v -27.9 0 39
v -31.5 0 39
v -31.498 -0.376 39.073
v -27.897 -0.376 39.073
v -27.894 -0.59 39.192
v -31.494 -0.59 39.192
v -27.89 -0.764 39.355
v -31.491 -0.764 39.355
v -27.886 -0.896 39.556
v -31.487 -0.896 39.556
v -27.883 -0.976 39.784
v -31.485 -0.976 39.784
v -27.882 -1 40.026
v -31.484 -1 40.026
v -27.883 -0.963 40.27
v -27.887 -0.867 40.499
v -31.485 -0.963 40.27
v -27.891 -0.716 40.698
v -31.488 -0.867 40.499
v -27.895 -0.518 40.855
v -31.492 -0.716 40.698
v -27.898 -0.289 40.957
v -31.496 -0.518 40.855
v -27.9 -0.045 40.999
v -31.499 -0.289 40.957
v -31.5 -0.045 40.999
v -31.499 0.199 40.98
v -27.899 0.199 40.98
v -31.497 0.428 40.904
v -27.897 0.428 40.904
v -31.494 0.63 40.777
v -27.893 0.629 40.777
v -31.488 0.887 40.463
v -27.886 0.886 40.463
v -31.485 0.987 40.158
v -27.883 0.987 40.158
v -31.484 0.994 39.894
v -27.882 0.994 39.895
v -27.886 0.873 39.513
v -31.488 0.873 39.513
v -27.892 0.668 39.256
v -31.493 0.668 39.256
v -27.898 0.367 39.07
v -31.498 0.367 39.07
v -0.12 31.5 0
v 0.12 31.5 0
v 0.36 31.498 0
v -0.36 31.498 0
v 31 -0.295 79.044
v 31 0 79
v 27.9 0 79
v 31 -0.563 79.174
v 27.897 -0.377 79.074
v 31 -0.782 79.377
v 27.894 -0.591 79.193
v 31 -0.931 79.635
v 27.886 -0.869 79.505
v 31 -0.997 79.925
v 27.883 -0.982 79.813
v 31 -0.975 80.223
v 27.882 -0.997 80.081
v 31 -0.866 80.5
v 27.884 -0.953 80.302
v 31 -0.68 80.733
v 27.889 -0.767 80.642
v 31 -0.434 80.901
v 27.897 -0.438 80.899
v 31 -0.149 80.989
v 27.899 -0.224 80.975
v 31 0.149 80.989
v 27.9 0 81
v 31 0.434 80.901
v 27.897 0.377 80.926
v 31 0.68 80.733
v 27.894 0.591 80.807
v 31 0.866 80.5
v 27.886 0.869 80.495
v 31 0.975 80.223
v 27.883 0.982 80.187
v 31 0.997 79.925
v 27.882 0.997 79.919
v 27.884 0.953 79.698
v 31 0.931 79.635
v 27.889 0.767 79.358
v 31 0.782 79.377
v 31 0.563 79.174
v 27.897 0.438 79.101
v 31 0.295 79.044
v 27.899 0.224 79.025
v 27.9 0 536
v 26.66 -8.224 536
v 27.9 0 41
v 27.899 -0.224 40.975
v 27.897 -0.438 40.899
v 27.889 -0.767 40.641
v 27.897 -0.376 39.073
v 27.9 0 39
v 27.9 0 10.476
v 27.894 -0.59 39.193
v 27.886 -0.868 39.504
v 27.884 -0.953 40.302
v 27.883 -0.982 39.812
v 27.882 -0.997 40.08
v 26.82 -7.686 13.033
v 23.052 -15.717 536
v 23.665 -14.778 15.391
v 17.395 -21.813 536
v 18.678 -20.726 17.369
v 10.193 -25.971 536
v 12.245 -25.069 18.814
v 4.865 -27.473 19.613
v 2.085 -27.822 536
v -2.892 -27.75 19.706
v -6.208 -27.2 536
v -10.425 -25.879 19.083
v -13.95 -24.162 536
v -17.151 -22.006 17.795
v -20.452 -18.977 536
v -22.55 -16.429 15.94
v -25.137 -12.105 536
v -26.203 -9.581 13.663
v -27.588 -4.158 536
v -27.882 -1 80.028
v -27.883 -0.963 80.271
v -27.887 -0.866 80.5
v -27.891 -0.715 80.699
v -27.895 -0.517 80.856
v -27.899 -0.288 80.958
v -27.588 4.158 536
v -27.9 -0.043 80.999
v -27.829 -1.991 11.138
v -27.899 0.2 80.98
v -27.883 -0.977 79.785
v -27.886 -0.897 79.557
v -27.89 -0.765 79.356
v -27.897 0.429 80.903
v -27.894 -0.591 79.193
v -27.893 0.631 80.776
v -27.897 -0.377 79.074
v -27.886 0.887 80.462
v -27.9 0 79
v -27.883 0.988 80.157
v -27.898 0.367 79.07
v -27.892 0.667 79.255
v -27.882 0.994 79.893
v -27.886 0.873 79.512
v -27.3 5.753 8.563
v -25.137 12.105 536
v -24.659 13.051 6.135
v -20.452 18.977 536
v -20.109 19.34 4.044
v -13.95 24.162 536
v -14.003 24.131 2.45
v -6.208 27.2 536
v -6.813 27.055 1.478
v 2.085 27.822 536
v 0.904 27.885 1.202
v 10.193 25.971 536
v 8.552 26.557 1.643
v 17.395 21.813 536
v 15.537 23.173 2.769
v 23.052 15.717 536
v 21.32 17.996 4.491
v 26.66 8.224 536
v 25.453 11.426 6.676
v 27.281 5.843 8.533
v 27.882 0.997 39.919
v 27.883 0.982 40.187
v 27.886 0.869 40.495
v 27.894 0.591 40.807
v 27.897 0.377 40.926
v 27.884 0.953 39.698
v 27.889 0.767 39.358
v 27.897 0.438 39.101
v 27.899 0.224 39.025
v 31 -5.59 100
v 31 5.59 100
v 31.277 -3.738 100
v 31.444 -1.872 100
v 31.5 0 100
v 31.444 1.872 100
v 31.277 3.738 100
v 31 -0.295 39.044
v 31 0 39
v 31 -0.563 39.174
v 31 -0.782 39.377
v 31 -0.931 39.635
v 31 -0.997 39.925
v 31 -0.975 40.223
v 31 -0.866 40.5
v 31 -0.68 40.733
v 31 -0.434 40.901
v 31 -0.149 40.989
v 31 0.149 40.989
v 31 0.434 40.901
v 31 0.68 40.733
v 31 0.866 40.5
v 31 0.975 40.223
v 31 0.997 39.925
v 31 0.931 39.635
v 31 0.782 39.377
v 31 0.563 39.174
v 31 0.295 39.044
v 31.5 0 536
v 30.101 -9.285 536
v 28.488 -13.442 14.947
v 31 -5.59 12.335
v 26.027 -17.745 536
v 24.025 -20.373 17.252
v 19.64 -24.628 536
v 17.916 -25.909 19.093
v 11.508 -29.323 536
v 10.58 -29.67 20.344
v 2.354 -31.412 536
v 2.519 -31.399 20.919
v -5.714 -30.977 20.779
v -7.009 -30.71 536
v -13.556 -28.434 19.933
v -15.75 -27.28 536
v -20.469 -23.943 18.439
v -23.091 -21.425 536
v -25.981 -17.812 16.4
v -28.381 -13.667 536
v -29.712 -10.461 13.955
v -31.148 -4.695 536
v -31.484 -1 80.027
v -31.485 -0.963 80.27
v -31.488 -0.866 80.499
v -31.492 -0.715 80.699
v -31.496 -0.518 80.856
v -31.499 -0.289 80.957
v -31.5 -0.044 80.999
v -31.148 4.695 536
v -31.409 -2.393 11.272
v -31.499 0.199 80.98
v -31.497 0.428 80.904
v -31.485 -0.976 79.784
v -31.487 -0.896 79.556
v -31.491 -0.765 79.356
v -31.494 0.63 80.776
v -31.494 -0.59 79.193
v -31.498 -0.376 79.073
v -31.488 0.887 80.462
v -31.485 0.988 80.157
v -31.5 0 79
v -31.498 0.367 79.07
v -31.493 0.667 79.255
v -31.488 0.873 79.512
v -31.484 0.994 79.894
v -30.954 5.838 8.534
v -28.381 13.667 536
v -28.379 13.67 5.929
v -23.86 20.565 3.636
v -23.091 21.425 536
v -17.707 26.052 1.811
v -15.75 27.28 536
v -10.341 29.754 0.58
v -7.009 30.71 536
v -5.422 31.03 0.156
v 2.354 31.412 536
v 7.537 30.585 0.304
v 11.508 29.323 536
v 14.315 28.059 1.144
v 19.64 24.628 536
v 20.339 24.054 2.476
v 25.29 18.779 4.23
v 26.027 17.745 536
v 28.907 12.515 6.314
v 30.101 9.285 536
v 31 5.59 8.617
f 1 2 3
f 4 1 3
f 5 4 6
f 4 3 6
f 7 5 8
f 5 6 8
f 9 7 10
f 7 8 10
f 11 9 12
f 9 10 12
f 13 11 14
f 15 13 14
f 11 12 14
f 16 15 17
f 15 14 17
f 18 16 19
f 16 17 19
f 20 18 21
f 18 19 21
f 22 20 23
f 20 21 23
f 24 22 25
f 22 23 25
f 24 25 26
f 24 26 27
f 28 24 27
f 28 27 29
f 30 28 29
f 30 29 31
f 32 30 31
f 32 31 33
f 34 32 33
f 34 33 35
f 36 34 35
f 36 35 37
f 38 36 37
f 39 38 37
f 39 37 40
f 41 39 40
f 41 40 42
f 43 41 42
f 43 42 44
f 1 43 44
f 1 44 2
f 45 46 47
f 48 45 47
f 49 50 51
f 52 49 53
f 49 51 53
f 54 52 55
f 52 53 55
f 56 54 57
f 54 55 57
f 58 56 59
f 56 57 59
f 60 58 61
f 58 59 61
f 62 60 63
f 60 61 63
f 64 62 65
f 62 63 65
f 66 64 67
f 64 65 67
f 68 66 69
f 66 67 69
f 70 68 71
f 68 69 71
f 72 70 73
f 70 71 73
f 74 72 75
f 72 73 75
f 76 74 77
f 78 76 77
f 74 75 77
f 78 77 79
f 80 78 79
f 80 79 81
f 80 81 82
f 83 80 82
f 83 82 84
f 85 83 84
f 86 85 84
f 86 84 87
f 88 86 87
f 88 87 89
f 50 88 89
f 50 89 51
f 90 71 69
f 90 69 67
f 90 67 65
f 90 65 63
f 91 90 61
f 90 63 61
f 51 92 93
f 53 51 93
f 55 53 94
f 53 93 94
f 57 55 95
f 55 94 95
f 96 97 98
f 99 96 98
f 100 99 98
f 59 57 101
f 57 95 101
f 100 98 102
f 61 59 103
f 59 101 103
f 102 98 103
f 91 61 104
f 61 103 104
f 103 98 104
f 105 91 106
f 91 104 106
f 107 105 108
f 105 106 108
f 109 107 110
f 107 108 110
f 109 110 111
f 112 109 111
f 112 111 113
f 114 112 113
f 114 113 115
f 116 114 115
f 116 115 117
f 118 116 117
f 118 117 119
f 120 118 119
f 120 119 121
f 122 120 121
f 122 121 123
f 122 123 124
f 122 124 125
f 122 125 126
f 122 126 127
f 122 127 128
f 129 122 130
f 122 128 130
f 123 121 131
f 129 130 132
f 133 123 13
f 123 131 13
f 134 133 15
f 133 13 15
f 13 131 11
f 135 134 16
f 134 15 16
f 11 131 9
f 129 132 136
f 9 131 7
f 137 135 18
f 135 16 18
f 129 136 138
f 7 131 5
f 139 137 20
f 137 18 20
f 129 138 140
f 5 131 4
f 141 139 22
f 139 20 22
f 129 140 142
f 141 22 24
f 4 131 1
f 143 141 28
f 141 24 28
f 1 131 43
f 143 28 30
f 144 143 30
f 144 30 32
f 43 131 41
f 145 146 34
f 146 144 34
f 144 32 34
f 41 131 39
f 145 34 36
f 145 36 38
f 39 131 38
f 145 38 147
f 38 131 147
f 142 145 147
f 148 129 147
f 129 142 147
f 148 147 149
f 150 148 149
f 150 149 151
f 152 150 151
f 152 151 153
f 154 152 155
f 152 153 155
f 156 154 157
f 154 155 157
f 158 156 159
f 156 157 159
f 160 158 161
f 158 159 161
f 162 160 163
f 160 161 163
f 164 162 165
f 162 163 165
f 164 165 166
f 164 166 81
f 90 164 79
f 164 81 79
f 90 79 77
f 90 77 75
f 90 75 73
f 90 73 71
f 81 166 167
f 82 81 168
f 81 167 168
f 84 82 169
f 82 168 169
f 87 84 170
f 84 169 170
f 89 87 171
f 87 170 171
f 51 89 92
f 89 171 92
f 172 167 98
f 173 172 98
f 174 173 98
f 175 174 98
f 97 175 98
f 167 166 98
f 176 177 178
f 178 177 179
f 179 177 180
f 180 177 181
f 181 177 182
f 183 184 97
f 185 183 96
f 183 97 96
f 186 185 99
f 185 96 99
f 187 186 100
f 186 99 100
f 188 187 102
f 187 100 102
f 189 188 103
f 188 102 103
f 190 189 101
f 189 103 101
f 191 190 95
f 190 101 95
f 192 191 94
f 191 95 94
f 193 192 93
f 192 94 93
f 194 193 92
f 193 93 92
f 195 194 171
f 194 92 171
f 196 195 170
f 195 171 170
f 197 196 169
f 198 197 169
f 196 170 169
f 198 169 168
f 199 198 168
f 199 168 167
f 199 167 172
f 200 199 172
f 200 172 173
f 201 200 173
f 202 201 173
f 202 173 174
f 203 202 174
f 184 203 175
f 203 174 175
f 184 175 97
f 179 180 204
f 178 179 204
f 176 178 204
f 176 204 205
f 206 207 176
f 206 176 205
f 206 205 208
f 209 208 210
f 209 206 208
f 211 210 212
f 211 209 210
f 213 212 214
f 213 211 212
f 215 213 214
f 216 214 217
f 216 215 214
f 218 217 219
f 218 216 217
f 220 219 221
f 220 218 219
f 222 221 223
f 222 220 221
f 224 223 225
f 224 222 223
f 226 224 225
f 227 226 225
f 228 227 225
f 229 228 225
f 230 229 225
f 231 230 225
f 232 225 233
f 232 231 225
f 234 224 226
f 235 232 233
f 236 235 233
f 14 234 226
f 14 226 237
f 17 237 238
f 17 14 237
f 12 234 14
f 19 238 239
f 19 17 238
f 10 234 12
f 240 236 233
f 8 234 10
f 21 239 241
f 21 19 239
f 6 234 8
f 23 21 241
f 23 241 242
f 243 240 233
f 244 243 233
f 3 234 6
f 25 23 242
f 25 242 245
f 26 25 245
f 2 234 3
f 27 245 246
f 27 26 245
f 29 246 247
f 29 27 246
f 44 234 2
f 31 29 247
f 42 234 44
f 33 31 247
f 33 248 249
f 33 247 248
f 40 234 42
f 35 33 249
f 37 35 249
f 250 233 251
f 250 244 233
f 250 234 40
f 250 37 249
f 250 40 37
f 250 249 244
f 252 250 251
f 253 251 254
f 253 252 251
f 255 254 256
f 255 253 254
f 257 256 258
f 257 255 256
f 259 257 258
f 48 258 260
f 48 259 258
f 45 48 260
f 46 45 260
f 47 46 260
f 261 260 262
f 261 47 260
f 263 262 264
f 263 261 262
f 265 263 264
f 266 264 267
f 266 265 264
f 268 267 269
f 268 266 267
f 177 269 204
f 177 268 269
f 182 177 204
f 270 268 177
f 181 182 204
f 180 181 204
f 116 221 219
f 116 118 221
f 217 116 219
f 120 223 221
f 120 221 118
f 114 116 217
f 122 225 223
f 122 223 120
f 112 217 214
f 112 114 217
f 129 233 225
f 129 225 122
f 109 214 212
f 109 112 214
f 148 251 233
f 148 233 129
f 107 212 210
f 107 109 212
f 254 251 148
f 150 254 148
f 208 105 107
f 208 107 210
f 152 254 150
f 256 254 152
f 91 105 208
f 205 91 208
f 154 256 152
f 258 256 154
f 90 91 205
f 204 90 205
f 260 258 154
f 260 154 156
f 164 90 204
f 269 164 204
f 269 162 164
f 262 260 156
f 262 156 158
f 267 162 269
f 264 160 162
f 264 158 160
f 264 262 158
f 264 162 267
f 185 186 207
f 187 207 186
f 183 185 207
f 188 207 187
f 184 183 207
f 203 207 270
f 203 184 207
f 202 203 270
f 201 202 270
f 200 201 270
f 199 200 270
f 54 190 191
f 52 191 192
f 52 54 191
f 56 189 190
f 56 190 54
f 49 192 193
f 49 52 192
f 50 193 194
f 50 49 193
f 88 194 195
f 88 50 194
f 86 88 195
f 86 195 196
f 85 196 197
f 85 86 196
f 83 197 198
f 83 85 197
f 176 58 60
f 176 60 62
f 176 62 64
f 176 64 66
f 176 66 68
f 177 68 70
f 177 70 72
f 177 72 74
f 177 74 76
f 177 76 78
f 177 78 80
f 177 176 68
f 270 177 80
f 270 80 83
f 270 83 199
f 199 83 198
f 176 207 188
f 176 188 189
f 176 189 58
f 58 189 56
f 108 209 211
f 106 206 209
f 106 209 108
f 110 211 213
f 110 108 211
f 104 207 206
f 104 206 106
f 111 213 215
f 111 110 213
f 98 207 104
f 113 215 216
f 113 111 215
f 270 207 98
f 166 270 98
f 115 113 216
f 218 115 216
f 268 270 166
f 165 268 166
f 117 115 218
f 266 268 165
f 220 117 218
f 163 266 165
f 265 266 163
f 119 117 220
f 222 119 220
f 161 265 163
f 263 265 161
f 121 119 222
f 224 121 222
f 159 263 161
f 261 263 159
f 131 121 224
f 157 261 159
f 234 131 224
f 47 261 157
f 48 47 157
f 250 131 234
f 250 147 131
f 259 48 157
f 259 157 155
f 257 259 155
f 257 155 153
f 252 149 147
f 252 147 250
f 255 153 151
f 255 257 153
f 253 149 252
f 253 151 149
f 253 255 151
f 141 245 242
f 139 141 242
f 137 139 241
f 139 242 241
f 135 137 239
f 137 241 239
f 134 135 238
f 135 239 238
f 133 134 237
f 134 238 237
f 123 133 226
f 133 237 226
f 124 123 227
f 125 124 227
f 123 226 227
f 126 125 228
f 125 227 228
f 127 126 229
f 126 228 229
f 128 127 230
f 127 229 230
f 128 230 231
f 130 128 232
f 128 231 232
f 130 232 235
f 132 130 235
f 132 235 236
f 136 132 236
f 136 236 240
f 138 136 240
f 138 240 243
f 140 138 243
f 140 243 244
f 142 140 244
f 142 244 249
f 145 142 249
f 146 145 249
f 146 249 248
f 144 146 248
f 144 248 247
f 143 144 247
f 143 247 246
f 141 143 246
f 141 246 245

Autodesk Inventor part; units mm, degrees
sketch "Sketch1" plane through (0, 0, 0) normal (0, 0, 1) x (1, 0, 0)
  circle A0 centre (0, 0) radius 31.5
  circle A1 centre (0, 0) radius 27.9
  dimension "d0" = 63
  dimension "d2" = 3.6
extrude "tube" add sketch "Sketch1" along normal blind 536
sketch "Sketch15" plane through (0, 0, 536) normal (0, 0, 1) x (1, 0, 0)
  circle A0 centre (0, 0) radius 27.9 projected
  circle A1 centre (0, 0) radius 31.5 projected
  point P0 (31.5, 0)
ref_plane "Work Plane6" through (31.5, 0, 536) normal (1, 0, 0) x (0, 1, 0)
ref_plane "Work Plane7" through (31, 0, 0) normal (1, 0, 0) x (0, 1, 0)
sketch "Sketch19" plane through (31, 0, 0) normal (1, 0, 0) x (0, 1, 0)
  line L0 (-10, 0) -> (10, 0)
  line L1 (10, 0) -> (10, 100)
  line L2 (10, 100) -> (-10, 100)
  line L3 (-10, 100) -> (-10, 0)
  point P0 (0, 0)
  point P1 (0, 0)
  dimension "d67" = 20
  dimension "d68" = 100
extrude "flatFaceYellow" cut sketch "Sketch19" along normal blind 25.4
sketch "Sketch21" plane through (0, 0, 0) normal (0, 0, -1) x (-1, 0, 0)
  line L0 (-31, 5.5902) -> (-31, -5.5902) projected
  arc A0 (-31, -5.5902) -> (-31, 5.5902) centre (0, 0) ccw projected
  circle A1 centre (0, 0) radius 27.9 projected
  line L1 (0.7293, 31.4916) -> (30.8537, 31.4916) construction
ref_plane "Work Plane8" through (-0.7293, 31.4916, 0) normal (0, -0.3156, -0.9489) x (-1, 0, 0)
sketch "Sketch22" plane through (-0.7293, 31.4916, 0) normal (0, -0.3156, -0.9489) x (-1, 0, 0)
  line L0 (-34.8075, -84.5558) -> (31.7452, -84.5558)
  line L1 (31.7452, -84.5558) -> (31.7452, 8.8585)
  line L2 (31.7452, 8.8585) -> (-34.8075, 8.8585)
  line L3 (-34.8075, 8.8585) -> (-34.8075, -84.5558)
  point P0 (-0.7293, -29.8816)
extrude "angledEnd" cut sketch "Sketch22" along normal blind 25.4
sketch "Sketch23" plane through (31, 0, 0) normal (1, 0, 0) x (0, 0, -1)
  line L0 (-12.3354, -5.5902) -> (-100, -5.5902) projected
  circle A0 centre (-80, 0) radius 3.2074
  circle A1 centre (-40, 0) radius 3.2074
  point P0 (0, 0)
  dimension "d89" = 80
  dimension "d92" = 40
hole "Hole3" at (31, 0, 80) at (31, 0, 40) direction (-1, 0, 0) diameter 2 end through all
properties part number "sparVert_B" material "PVC-Piping"
